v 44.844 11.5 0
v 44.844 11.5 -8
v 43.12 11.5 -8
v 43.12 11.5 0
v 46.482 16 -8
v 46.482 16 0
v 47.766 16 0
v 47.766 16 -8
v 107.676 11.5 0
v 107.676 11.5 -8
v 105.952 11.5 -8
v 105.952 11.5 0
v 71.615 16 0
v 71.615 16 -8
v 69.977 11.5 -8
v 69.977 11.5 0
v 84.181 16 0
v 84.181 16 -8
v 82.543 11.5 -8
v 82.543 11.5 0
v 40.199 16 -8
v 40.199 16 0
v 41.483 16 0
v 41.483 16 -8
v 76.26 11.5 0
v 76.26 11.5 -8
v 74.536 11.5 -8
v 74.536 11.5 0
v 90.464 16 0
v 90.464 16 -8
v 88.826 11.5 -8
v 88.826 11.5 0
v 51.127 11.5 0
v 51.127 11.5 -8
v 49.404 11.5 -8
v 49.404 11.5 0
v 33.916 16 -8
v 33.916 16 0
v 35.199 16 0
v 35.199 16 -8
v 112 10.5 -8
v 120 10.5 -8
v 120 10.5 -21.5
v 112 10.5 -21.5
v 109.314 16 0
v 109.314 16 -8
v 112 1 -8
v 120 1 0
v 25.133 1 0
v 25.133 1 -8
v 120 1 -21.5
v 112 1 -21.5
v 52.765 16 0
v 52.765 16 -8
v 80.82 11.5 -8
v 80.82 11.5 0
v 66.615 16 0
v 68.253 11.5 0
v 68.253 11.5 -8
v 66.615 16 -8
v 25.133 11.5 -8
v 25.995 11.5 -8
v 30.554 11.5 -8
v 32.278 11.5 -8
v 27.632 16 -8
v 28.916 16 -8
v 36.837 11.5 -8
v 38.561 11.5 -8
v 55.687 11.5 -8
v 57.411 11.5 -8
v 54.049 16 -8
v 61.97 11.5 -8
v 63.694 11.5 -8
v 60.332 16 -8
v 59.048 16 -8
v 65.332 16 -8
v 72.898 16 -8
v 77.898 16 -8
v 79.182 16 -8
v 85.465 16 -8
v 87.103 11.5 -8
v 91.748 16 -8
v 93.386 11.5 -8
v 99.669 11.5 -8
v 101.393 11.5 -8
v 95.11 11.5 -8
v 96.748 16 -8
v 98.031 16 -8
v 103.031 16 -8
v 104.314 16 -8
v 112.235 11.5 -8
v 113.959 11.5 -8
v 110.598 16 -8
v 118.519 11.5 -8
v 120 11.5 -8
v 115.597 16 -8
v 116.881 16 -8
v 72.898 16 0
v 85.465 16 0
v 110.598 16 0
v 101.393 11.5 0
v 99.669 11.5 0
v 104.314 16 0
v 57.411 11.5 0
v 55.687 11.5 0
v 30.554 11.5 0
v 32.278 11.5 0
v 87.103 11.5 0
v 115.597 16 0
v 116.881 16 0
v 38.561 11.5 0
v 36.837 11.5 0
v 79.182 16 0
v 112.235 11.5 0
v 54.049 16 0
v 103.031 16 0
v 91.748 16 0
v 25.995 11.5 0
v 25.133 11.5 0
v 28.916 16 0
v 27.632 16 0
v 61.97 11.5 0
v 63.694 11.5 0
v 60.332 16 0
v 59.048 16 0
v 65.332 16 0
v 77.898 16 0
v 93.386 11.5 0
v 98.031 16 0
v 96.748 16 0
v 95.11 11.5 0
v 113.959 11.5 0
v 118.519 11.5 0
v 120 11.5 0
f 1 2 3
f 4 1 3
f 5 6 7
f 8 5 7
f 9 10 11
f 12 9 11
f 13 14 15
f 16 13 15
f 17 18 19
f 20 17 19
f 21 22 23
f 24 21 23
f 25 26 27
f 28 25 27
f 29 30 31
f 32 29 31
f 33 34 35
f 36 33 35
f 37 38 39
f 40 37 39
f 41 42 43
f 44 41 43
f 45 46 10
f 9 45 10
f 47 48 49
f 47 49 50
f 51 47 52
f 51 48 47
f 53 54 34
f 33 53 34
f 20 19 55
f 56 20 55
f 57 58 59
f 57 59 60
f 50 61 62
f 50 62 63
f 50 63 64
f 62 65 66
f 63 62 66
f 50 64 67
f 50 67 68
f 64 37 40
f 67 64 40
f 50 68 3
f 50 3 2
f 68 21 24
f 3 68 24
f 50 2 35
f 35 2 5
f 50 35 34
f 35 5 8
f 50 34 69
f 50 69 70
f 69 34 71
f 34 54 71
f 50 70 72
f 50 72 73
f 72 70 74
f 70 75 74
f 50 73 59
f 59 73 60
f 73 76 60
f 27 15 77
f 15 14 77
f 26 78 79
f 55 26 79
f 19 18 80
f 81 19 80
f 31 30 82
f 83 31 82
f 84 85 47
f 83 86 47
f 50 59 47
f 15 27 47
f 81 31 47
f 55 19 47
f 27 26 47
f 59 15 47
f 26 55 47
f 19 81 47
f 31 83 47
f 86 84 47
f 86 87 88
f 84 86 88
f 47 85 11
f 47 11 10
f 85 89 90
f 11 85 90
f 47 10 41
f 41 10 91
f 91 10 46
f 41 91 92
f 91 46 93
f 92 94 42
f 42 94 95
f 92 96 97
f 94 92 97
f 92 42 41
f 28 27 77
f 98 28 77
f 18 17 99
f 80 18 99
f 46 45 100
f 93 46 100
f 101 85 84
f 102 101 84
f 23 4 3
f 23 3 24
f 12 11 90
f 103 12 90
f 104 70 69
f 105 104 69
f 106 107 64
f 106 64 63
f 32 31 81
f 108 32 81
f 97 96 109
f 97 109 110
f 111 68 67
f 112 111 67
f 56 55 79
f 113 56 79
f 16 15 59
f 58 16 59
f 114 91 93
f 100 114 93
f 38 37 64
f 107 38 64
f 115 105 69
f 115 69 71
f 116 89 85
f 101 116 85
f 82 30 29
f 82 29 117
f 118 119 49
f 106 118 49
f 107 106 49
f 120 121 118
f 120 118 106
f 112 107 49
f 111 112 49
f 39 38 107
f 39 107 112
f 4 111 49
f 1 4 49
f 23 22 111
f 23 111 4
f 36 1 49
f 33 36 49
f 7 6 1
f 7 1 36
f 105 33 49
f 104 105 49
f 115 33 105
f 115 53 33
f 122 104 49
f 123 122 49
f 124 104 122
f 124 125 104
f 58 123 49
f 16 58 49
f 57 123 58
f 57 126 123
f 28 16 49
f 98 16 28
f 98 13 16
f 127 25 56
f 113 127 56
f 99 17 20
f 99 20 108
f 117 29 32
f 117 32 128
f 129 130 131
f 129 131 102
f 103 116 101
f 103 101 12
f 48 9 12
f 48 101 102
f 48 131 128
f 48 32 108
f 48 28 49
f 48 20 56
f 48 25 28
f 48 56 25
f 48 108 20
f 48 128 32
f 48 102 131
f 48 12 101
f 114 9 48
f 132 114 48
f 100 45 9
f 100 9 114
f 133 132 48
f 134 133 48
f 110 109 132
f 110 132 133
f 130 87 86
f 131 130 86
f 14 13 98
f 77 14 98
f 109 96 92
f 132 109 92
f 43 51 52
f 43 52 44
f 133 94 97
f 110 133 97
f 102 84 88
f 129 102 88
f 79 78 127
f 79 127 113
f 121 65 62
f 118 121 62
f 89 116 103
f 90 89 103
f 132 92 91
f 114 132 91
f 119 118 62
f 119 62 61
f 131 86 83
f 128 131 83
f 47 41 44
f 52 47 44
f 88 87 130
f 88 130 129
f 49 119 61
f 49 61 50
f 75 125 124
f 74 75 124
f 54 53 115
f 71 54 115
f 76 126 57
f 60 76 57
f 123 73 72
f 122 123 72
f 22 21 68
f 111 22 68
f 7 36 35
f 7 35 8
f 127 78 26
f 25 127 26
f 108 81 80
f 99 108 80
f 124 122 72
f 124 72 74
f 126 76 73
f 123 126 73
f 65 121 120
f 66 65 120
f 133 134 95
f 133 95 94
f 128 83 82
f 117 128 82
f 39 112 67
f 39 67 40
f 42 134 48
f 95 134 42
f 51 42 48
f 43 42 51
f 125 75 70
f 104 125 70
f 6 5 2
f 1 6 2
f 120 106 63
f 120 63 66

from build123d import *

# Parameters (mm, degrees)
BLANKSKE_W          = 120
BLANKSKE_H          = 16
BLANK_DEPTH         = 8
TOOTHCUTSIM_DEPTH   = 122.326007105
TEETHCUTS_COUNT     = 20
TEETHCUTS_PITCH     = 6.2831853
SKETCH1_W           = 8
SKETCH1_H           = 1
CUT_EXTRUDE1_DEPTH  = 122.326007105
SKETCH2_W           = 13.5
SKETCH2_H           = 9.5
BOSS_EXTRUDE2_DEPTH = 8
CUT_EXTRUDE2_DEPTH  = 123.956293048


with BuildPart() as part:
    # BlankSke → Blank (new body)
    with BuildSketch(Plane.XY):
        with Locations((60, 8)):
            Rectangle(BLANKSKE_W, BLANKSKE_H)
    extrude(amount=-BLANK_DEPTH)

    # TooCutSkeSim → ToothCutSim (cut, through all)
    with BuildSketch(Plane.XY):
        Polygon((0.861870739, 11.5), (-0.861870739, 11.5), (-2.508981637, 16.0254), (2.508981637, 16.0254), align=None)
    toothcutsim = extrude(amount=-TOOTHCUTSIM_DEPTH, mode=Mode.SUBTRACT)

    # TeethCuts: ToothCutSim ×20
    with Locations(*[(i * TEETHCUTS_PITCH, 0, 0) for i in range(1, TEETHCUTS_COUNT)]):
        add(toothcutsim, mode=Mode.SUBTRACT)

    # Sketch1 → Cut-Extrude1 (cut, through all)
    with BuildSketch(Plane(origin=(120, 0, 0), x_dir=(0, 0, -1), z_dir=(1, 0, 0))):
        with Locations((4, 0.5)):
            Rectangle(SKETCH1_W, SKETCH1_H)
    extrude(amount=-CUT_EXTRUDE1_DEPTH, mode=Mode.SUBTRACT)

    # Sketch2 → Boss-Extrude2 (add)
    with BuildSketch(Plane(origin=(120, 0, 0), x_dir=(0, 0, -1), z_dir=(1, 0, 0))):
        with Locations((14.75, 5.75)):
            Rectangle(SKETCH2_W, SKETCH2_H)
    extrude(amount=-BOSS_EXTRUDE2_DEPTH)

    # Sketch3 → Cut-Extrude2 (cut, through all)
    with BuildSketch(Plane.XY):
        with BuildLine():
            Line((0, 1), (0, 11.5))
            ThreePointArc((0, 11.5), (0.43093537, 11.93093537), (0.861870739, 11.5))
            Line((0.861870739, 11.5), (2.499736794, 16))
            Line((2.499736794, 16), (3.783448506, 16))
            Line((3.783448506, 16), (5.421314561, 11.5))
            Line((5.421314561, 11.5), (7.145056039, 11.5))
            Line((7.145056039, 11.5), (8.782922094, 16))
            Line((8.782922094, 16), (10.066633806, 16))
            Line((10.066633806, 16), (11.704499861, 11.5))
            Line((11.704499861, 11.5), (13.428241339, 11.5))
            Line((13.428241339, 11.5), (15.066107394, 16))
            Line((15.066107394, 16), (15.70796325, 16))
            Line((15.70796325, 16), (16.349819106, 16))
            Line((16.349819106, 16), (17.987685161, 11.5))
            Line((17.987685161, 11.5), (19.711426639, 11.5))
            Line((19.711426639, 11.5), (21.349292694, 16))
            Line((21.349292694, 16), (22.633004406, 16))
            Line((22.633004406, 16), (24.270870461, 11.5))
            Line((24.270870461, 11.5), (25.1327412, 11.5))
            Line((25.1327412, 11.5), (25.1327412, 1))
            Line((25.1327412, 1), (17.987685161, 1))
            Line((17.987685161, 1), (15.70796325, 1))
            Line((15.70796325, 1), (6.161314561, 1))
            Line((6.161314561, 1), (0, 1))
        make_face()
    extrude(amount=-CUT_EXTRUDE2_DEPTH, mode=Mode.SUBTRACT)


solid = part.part
